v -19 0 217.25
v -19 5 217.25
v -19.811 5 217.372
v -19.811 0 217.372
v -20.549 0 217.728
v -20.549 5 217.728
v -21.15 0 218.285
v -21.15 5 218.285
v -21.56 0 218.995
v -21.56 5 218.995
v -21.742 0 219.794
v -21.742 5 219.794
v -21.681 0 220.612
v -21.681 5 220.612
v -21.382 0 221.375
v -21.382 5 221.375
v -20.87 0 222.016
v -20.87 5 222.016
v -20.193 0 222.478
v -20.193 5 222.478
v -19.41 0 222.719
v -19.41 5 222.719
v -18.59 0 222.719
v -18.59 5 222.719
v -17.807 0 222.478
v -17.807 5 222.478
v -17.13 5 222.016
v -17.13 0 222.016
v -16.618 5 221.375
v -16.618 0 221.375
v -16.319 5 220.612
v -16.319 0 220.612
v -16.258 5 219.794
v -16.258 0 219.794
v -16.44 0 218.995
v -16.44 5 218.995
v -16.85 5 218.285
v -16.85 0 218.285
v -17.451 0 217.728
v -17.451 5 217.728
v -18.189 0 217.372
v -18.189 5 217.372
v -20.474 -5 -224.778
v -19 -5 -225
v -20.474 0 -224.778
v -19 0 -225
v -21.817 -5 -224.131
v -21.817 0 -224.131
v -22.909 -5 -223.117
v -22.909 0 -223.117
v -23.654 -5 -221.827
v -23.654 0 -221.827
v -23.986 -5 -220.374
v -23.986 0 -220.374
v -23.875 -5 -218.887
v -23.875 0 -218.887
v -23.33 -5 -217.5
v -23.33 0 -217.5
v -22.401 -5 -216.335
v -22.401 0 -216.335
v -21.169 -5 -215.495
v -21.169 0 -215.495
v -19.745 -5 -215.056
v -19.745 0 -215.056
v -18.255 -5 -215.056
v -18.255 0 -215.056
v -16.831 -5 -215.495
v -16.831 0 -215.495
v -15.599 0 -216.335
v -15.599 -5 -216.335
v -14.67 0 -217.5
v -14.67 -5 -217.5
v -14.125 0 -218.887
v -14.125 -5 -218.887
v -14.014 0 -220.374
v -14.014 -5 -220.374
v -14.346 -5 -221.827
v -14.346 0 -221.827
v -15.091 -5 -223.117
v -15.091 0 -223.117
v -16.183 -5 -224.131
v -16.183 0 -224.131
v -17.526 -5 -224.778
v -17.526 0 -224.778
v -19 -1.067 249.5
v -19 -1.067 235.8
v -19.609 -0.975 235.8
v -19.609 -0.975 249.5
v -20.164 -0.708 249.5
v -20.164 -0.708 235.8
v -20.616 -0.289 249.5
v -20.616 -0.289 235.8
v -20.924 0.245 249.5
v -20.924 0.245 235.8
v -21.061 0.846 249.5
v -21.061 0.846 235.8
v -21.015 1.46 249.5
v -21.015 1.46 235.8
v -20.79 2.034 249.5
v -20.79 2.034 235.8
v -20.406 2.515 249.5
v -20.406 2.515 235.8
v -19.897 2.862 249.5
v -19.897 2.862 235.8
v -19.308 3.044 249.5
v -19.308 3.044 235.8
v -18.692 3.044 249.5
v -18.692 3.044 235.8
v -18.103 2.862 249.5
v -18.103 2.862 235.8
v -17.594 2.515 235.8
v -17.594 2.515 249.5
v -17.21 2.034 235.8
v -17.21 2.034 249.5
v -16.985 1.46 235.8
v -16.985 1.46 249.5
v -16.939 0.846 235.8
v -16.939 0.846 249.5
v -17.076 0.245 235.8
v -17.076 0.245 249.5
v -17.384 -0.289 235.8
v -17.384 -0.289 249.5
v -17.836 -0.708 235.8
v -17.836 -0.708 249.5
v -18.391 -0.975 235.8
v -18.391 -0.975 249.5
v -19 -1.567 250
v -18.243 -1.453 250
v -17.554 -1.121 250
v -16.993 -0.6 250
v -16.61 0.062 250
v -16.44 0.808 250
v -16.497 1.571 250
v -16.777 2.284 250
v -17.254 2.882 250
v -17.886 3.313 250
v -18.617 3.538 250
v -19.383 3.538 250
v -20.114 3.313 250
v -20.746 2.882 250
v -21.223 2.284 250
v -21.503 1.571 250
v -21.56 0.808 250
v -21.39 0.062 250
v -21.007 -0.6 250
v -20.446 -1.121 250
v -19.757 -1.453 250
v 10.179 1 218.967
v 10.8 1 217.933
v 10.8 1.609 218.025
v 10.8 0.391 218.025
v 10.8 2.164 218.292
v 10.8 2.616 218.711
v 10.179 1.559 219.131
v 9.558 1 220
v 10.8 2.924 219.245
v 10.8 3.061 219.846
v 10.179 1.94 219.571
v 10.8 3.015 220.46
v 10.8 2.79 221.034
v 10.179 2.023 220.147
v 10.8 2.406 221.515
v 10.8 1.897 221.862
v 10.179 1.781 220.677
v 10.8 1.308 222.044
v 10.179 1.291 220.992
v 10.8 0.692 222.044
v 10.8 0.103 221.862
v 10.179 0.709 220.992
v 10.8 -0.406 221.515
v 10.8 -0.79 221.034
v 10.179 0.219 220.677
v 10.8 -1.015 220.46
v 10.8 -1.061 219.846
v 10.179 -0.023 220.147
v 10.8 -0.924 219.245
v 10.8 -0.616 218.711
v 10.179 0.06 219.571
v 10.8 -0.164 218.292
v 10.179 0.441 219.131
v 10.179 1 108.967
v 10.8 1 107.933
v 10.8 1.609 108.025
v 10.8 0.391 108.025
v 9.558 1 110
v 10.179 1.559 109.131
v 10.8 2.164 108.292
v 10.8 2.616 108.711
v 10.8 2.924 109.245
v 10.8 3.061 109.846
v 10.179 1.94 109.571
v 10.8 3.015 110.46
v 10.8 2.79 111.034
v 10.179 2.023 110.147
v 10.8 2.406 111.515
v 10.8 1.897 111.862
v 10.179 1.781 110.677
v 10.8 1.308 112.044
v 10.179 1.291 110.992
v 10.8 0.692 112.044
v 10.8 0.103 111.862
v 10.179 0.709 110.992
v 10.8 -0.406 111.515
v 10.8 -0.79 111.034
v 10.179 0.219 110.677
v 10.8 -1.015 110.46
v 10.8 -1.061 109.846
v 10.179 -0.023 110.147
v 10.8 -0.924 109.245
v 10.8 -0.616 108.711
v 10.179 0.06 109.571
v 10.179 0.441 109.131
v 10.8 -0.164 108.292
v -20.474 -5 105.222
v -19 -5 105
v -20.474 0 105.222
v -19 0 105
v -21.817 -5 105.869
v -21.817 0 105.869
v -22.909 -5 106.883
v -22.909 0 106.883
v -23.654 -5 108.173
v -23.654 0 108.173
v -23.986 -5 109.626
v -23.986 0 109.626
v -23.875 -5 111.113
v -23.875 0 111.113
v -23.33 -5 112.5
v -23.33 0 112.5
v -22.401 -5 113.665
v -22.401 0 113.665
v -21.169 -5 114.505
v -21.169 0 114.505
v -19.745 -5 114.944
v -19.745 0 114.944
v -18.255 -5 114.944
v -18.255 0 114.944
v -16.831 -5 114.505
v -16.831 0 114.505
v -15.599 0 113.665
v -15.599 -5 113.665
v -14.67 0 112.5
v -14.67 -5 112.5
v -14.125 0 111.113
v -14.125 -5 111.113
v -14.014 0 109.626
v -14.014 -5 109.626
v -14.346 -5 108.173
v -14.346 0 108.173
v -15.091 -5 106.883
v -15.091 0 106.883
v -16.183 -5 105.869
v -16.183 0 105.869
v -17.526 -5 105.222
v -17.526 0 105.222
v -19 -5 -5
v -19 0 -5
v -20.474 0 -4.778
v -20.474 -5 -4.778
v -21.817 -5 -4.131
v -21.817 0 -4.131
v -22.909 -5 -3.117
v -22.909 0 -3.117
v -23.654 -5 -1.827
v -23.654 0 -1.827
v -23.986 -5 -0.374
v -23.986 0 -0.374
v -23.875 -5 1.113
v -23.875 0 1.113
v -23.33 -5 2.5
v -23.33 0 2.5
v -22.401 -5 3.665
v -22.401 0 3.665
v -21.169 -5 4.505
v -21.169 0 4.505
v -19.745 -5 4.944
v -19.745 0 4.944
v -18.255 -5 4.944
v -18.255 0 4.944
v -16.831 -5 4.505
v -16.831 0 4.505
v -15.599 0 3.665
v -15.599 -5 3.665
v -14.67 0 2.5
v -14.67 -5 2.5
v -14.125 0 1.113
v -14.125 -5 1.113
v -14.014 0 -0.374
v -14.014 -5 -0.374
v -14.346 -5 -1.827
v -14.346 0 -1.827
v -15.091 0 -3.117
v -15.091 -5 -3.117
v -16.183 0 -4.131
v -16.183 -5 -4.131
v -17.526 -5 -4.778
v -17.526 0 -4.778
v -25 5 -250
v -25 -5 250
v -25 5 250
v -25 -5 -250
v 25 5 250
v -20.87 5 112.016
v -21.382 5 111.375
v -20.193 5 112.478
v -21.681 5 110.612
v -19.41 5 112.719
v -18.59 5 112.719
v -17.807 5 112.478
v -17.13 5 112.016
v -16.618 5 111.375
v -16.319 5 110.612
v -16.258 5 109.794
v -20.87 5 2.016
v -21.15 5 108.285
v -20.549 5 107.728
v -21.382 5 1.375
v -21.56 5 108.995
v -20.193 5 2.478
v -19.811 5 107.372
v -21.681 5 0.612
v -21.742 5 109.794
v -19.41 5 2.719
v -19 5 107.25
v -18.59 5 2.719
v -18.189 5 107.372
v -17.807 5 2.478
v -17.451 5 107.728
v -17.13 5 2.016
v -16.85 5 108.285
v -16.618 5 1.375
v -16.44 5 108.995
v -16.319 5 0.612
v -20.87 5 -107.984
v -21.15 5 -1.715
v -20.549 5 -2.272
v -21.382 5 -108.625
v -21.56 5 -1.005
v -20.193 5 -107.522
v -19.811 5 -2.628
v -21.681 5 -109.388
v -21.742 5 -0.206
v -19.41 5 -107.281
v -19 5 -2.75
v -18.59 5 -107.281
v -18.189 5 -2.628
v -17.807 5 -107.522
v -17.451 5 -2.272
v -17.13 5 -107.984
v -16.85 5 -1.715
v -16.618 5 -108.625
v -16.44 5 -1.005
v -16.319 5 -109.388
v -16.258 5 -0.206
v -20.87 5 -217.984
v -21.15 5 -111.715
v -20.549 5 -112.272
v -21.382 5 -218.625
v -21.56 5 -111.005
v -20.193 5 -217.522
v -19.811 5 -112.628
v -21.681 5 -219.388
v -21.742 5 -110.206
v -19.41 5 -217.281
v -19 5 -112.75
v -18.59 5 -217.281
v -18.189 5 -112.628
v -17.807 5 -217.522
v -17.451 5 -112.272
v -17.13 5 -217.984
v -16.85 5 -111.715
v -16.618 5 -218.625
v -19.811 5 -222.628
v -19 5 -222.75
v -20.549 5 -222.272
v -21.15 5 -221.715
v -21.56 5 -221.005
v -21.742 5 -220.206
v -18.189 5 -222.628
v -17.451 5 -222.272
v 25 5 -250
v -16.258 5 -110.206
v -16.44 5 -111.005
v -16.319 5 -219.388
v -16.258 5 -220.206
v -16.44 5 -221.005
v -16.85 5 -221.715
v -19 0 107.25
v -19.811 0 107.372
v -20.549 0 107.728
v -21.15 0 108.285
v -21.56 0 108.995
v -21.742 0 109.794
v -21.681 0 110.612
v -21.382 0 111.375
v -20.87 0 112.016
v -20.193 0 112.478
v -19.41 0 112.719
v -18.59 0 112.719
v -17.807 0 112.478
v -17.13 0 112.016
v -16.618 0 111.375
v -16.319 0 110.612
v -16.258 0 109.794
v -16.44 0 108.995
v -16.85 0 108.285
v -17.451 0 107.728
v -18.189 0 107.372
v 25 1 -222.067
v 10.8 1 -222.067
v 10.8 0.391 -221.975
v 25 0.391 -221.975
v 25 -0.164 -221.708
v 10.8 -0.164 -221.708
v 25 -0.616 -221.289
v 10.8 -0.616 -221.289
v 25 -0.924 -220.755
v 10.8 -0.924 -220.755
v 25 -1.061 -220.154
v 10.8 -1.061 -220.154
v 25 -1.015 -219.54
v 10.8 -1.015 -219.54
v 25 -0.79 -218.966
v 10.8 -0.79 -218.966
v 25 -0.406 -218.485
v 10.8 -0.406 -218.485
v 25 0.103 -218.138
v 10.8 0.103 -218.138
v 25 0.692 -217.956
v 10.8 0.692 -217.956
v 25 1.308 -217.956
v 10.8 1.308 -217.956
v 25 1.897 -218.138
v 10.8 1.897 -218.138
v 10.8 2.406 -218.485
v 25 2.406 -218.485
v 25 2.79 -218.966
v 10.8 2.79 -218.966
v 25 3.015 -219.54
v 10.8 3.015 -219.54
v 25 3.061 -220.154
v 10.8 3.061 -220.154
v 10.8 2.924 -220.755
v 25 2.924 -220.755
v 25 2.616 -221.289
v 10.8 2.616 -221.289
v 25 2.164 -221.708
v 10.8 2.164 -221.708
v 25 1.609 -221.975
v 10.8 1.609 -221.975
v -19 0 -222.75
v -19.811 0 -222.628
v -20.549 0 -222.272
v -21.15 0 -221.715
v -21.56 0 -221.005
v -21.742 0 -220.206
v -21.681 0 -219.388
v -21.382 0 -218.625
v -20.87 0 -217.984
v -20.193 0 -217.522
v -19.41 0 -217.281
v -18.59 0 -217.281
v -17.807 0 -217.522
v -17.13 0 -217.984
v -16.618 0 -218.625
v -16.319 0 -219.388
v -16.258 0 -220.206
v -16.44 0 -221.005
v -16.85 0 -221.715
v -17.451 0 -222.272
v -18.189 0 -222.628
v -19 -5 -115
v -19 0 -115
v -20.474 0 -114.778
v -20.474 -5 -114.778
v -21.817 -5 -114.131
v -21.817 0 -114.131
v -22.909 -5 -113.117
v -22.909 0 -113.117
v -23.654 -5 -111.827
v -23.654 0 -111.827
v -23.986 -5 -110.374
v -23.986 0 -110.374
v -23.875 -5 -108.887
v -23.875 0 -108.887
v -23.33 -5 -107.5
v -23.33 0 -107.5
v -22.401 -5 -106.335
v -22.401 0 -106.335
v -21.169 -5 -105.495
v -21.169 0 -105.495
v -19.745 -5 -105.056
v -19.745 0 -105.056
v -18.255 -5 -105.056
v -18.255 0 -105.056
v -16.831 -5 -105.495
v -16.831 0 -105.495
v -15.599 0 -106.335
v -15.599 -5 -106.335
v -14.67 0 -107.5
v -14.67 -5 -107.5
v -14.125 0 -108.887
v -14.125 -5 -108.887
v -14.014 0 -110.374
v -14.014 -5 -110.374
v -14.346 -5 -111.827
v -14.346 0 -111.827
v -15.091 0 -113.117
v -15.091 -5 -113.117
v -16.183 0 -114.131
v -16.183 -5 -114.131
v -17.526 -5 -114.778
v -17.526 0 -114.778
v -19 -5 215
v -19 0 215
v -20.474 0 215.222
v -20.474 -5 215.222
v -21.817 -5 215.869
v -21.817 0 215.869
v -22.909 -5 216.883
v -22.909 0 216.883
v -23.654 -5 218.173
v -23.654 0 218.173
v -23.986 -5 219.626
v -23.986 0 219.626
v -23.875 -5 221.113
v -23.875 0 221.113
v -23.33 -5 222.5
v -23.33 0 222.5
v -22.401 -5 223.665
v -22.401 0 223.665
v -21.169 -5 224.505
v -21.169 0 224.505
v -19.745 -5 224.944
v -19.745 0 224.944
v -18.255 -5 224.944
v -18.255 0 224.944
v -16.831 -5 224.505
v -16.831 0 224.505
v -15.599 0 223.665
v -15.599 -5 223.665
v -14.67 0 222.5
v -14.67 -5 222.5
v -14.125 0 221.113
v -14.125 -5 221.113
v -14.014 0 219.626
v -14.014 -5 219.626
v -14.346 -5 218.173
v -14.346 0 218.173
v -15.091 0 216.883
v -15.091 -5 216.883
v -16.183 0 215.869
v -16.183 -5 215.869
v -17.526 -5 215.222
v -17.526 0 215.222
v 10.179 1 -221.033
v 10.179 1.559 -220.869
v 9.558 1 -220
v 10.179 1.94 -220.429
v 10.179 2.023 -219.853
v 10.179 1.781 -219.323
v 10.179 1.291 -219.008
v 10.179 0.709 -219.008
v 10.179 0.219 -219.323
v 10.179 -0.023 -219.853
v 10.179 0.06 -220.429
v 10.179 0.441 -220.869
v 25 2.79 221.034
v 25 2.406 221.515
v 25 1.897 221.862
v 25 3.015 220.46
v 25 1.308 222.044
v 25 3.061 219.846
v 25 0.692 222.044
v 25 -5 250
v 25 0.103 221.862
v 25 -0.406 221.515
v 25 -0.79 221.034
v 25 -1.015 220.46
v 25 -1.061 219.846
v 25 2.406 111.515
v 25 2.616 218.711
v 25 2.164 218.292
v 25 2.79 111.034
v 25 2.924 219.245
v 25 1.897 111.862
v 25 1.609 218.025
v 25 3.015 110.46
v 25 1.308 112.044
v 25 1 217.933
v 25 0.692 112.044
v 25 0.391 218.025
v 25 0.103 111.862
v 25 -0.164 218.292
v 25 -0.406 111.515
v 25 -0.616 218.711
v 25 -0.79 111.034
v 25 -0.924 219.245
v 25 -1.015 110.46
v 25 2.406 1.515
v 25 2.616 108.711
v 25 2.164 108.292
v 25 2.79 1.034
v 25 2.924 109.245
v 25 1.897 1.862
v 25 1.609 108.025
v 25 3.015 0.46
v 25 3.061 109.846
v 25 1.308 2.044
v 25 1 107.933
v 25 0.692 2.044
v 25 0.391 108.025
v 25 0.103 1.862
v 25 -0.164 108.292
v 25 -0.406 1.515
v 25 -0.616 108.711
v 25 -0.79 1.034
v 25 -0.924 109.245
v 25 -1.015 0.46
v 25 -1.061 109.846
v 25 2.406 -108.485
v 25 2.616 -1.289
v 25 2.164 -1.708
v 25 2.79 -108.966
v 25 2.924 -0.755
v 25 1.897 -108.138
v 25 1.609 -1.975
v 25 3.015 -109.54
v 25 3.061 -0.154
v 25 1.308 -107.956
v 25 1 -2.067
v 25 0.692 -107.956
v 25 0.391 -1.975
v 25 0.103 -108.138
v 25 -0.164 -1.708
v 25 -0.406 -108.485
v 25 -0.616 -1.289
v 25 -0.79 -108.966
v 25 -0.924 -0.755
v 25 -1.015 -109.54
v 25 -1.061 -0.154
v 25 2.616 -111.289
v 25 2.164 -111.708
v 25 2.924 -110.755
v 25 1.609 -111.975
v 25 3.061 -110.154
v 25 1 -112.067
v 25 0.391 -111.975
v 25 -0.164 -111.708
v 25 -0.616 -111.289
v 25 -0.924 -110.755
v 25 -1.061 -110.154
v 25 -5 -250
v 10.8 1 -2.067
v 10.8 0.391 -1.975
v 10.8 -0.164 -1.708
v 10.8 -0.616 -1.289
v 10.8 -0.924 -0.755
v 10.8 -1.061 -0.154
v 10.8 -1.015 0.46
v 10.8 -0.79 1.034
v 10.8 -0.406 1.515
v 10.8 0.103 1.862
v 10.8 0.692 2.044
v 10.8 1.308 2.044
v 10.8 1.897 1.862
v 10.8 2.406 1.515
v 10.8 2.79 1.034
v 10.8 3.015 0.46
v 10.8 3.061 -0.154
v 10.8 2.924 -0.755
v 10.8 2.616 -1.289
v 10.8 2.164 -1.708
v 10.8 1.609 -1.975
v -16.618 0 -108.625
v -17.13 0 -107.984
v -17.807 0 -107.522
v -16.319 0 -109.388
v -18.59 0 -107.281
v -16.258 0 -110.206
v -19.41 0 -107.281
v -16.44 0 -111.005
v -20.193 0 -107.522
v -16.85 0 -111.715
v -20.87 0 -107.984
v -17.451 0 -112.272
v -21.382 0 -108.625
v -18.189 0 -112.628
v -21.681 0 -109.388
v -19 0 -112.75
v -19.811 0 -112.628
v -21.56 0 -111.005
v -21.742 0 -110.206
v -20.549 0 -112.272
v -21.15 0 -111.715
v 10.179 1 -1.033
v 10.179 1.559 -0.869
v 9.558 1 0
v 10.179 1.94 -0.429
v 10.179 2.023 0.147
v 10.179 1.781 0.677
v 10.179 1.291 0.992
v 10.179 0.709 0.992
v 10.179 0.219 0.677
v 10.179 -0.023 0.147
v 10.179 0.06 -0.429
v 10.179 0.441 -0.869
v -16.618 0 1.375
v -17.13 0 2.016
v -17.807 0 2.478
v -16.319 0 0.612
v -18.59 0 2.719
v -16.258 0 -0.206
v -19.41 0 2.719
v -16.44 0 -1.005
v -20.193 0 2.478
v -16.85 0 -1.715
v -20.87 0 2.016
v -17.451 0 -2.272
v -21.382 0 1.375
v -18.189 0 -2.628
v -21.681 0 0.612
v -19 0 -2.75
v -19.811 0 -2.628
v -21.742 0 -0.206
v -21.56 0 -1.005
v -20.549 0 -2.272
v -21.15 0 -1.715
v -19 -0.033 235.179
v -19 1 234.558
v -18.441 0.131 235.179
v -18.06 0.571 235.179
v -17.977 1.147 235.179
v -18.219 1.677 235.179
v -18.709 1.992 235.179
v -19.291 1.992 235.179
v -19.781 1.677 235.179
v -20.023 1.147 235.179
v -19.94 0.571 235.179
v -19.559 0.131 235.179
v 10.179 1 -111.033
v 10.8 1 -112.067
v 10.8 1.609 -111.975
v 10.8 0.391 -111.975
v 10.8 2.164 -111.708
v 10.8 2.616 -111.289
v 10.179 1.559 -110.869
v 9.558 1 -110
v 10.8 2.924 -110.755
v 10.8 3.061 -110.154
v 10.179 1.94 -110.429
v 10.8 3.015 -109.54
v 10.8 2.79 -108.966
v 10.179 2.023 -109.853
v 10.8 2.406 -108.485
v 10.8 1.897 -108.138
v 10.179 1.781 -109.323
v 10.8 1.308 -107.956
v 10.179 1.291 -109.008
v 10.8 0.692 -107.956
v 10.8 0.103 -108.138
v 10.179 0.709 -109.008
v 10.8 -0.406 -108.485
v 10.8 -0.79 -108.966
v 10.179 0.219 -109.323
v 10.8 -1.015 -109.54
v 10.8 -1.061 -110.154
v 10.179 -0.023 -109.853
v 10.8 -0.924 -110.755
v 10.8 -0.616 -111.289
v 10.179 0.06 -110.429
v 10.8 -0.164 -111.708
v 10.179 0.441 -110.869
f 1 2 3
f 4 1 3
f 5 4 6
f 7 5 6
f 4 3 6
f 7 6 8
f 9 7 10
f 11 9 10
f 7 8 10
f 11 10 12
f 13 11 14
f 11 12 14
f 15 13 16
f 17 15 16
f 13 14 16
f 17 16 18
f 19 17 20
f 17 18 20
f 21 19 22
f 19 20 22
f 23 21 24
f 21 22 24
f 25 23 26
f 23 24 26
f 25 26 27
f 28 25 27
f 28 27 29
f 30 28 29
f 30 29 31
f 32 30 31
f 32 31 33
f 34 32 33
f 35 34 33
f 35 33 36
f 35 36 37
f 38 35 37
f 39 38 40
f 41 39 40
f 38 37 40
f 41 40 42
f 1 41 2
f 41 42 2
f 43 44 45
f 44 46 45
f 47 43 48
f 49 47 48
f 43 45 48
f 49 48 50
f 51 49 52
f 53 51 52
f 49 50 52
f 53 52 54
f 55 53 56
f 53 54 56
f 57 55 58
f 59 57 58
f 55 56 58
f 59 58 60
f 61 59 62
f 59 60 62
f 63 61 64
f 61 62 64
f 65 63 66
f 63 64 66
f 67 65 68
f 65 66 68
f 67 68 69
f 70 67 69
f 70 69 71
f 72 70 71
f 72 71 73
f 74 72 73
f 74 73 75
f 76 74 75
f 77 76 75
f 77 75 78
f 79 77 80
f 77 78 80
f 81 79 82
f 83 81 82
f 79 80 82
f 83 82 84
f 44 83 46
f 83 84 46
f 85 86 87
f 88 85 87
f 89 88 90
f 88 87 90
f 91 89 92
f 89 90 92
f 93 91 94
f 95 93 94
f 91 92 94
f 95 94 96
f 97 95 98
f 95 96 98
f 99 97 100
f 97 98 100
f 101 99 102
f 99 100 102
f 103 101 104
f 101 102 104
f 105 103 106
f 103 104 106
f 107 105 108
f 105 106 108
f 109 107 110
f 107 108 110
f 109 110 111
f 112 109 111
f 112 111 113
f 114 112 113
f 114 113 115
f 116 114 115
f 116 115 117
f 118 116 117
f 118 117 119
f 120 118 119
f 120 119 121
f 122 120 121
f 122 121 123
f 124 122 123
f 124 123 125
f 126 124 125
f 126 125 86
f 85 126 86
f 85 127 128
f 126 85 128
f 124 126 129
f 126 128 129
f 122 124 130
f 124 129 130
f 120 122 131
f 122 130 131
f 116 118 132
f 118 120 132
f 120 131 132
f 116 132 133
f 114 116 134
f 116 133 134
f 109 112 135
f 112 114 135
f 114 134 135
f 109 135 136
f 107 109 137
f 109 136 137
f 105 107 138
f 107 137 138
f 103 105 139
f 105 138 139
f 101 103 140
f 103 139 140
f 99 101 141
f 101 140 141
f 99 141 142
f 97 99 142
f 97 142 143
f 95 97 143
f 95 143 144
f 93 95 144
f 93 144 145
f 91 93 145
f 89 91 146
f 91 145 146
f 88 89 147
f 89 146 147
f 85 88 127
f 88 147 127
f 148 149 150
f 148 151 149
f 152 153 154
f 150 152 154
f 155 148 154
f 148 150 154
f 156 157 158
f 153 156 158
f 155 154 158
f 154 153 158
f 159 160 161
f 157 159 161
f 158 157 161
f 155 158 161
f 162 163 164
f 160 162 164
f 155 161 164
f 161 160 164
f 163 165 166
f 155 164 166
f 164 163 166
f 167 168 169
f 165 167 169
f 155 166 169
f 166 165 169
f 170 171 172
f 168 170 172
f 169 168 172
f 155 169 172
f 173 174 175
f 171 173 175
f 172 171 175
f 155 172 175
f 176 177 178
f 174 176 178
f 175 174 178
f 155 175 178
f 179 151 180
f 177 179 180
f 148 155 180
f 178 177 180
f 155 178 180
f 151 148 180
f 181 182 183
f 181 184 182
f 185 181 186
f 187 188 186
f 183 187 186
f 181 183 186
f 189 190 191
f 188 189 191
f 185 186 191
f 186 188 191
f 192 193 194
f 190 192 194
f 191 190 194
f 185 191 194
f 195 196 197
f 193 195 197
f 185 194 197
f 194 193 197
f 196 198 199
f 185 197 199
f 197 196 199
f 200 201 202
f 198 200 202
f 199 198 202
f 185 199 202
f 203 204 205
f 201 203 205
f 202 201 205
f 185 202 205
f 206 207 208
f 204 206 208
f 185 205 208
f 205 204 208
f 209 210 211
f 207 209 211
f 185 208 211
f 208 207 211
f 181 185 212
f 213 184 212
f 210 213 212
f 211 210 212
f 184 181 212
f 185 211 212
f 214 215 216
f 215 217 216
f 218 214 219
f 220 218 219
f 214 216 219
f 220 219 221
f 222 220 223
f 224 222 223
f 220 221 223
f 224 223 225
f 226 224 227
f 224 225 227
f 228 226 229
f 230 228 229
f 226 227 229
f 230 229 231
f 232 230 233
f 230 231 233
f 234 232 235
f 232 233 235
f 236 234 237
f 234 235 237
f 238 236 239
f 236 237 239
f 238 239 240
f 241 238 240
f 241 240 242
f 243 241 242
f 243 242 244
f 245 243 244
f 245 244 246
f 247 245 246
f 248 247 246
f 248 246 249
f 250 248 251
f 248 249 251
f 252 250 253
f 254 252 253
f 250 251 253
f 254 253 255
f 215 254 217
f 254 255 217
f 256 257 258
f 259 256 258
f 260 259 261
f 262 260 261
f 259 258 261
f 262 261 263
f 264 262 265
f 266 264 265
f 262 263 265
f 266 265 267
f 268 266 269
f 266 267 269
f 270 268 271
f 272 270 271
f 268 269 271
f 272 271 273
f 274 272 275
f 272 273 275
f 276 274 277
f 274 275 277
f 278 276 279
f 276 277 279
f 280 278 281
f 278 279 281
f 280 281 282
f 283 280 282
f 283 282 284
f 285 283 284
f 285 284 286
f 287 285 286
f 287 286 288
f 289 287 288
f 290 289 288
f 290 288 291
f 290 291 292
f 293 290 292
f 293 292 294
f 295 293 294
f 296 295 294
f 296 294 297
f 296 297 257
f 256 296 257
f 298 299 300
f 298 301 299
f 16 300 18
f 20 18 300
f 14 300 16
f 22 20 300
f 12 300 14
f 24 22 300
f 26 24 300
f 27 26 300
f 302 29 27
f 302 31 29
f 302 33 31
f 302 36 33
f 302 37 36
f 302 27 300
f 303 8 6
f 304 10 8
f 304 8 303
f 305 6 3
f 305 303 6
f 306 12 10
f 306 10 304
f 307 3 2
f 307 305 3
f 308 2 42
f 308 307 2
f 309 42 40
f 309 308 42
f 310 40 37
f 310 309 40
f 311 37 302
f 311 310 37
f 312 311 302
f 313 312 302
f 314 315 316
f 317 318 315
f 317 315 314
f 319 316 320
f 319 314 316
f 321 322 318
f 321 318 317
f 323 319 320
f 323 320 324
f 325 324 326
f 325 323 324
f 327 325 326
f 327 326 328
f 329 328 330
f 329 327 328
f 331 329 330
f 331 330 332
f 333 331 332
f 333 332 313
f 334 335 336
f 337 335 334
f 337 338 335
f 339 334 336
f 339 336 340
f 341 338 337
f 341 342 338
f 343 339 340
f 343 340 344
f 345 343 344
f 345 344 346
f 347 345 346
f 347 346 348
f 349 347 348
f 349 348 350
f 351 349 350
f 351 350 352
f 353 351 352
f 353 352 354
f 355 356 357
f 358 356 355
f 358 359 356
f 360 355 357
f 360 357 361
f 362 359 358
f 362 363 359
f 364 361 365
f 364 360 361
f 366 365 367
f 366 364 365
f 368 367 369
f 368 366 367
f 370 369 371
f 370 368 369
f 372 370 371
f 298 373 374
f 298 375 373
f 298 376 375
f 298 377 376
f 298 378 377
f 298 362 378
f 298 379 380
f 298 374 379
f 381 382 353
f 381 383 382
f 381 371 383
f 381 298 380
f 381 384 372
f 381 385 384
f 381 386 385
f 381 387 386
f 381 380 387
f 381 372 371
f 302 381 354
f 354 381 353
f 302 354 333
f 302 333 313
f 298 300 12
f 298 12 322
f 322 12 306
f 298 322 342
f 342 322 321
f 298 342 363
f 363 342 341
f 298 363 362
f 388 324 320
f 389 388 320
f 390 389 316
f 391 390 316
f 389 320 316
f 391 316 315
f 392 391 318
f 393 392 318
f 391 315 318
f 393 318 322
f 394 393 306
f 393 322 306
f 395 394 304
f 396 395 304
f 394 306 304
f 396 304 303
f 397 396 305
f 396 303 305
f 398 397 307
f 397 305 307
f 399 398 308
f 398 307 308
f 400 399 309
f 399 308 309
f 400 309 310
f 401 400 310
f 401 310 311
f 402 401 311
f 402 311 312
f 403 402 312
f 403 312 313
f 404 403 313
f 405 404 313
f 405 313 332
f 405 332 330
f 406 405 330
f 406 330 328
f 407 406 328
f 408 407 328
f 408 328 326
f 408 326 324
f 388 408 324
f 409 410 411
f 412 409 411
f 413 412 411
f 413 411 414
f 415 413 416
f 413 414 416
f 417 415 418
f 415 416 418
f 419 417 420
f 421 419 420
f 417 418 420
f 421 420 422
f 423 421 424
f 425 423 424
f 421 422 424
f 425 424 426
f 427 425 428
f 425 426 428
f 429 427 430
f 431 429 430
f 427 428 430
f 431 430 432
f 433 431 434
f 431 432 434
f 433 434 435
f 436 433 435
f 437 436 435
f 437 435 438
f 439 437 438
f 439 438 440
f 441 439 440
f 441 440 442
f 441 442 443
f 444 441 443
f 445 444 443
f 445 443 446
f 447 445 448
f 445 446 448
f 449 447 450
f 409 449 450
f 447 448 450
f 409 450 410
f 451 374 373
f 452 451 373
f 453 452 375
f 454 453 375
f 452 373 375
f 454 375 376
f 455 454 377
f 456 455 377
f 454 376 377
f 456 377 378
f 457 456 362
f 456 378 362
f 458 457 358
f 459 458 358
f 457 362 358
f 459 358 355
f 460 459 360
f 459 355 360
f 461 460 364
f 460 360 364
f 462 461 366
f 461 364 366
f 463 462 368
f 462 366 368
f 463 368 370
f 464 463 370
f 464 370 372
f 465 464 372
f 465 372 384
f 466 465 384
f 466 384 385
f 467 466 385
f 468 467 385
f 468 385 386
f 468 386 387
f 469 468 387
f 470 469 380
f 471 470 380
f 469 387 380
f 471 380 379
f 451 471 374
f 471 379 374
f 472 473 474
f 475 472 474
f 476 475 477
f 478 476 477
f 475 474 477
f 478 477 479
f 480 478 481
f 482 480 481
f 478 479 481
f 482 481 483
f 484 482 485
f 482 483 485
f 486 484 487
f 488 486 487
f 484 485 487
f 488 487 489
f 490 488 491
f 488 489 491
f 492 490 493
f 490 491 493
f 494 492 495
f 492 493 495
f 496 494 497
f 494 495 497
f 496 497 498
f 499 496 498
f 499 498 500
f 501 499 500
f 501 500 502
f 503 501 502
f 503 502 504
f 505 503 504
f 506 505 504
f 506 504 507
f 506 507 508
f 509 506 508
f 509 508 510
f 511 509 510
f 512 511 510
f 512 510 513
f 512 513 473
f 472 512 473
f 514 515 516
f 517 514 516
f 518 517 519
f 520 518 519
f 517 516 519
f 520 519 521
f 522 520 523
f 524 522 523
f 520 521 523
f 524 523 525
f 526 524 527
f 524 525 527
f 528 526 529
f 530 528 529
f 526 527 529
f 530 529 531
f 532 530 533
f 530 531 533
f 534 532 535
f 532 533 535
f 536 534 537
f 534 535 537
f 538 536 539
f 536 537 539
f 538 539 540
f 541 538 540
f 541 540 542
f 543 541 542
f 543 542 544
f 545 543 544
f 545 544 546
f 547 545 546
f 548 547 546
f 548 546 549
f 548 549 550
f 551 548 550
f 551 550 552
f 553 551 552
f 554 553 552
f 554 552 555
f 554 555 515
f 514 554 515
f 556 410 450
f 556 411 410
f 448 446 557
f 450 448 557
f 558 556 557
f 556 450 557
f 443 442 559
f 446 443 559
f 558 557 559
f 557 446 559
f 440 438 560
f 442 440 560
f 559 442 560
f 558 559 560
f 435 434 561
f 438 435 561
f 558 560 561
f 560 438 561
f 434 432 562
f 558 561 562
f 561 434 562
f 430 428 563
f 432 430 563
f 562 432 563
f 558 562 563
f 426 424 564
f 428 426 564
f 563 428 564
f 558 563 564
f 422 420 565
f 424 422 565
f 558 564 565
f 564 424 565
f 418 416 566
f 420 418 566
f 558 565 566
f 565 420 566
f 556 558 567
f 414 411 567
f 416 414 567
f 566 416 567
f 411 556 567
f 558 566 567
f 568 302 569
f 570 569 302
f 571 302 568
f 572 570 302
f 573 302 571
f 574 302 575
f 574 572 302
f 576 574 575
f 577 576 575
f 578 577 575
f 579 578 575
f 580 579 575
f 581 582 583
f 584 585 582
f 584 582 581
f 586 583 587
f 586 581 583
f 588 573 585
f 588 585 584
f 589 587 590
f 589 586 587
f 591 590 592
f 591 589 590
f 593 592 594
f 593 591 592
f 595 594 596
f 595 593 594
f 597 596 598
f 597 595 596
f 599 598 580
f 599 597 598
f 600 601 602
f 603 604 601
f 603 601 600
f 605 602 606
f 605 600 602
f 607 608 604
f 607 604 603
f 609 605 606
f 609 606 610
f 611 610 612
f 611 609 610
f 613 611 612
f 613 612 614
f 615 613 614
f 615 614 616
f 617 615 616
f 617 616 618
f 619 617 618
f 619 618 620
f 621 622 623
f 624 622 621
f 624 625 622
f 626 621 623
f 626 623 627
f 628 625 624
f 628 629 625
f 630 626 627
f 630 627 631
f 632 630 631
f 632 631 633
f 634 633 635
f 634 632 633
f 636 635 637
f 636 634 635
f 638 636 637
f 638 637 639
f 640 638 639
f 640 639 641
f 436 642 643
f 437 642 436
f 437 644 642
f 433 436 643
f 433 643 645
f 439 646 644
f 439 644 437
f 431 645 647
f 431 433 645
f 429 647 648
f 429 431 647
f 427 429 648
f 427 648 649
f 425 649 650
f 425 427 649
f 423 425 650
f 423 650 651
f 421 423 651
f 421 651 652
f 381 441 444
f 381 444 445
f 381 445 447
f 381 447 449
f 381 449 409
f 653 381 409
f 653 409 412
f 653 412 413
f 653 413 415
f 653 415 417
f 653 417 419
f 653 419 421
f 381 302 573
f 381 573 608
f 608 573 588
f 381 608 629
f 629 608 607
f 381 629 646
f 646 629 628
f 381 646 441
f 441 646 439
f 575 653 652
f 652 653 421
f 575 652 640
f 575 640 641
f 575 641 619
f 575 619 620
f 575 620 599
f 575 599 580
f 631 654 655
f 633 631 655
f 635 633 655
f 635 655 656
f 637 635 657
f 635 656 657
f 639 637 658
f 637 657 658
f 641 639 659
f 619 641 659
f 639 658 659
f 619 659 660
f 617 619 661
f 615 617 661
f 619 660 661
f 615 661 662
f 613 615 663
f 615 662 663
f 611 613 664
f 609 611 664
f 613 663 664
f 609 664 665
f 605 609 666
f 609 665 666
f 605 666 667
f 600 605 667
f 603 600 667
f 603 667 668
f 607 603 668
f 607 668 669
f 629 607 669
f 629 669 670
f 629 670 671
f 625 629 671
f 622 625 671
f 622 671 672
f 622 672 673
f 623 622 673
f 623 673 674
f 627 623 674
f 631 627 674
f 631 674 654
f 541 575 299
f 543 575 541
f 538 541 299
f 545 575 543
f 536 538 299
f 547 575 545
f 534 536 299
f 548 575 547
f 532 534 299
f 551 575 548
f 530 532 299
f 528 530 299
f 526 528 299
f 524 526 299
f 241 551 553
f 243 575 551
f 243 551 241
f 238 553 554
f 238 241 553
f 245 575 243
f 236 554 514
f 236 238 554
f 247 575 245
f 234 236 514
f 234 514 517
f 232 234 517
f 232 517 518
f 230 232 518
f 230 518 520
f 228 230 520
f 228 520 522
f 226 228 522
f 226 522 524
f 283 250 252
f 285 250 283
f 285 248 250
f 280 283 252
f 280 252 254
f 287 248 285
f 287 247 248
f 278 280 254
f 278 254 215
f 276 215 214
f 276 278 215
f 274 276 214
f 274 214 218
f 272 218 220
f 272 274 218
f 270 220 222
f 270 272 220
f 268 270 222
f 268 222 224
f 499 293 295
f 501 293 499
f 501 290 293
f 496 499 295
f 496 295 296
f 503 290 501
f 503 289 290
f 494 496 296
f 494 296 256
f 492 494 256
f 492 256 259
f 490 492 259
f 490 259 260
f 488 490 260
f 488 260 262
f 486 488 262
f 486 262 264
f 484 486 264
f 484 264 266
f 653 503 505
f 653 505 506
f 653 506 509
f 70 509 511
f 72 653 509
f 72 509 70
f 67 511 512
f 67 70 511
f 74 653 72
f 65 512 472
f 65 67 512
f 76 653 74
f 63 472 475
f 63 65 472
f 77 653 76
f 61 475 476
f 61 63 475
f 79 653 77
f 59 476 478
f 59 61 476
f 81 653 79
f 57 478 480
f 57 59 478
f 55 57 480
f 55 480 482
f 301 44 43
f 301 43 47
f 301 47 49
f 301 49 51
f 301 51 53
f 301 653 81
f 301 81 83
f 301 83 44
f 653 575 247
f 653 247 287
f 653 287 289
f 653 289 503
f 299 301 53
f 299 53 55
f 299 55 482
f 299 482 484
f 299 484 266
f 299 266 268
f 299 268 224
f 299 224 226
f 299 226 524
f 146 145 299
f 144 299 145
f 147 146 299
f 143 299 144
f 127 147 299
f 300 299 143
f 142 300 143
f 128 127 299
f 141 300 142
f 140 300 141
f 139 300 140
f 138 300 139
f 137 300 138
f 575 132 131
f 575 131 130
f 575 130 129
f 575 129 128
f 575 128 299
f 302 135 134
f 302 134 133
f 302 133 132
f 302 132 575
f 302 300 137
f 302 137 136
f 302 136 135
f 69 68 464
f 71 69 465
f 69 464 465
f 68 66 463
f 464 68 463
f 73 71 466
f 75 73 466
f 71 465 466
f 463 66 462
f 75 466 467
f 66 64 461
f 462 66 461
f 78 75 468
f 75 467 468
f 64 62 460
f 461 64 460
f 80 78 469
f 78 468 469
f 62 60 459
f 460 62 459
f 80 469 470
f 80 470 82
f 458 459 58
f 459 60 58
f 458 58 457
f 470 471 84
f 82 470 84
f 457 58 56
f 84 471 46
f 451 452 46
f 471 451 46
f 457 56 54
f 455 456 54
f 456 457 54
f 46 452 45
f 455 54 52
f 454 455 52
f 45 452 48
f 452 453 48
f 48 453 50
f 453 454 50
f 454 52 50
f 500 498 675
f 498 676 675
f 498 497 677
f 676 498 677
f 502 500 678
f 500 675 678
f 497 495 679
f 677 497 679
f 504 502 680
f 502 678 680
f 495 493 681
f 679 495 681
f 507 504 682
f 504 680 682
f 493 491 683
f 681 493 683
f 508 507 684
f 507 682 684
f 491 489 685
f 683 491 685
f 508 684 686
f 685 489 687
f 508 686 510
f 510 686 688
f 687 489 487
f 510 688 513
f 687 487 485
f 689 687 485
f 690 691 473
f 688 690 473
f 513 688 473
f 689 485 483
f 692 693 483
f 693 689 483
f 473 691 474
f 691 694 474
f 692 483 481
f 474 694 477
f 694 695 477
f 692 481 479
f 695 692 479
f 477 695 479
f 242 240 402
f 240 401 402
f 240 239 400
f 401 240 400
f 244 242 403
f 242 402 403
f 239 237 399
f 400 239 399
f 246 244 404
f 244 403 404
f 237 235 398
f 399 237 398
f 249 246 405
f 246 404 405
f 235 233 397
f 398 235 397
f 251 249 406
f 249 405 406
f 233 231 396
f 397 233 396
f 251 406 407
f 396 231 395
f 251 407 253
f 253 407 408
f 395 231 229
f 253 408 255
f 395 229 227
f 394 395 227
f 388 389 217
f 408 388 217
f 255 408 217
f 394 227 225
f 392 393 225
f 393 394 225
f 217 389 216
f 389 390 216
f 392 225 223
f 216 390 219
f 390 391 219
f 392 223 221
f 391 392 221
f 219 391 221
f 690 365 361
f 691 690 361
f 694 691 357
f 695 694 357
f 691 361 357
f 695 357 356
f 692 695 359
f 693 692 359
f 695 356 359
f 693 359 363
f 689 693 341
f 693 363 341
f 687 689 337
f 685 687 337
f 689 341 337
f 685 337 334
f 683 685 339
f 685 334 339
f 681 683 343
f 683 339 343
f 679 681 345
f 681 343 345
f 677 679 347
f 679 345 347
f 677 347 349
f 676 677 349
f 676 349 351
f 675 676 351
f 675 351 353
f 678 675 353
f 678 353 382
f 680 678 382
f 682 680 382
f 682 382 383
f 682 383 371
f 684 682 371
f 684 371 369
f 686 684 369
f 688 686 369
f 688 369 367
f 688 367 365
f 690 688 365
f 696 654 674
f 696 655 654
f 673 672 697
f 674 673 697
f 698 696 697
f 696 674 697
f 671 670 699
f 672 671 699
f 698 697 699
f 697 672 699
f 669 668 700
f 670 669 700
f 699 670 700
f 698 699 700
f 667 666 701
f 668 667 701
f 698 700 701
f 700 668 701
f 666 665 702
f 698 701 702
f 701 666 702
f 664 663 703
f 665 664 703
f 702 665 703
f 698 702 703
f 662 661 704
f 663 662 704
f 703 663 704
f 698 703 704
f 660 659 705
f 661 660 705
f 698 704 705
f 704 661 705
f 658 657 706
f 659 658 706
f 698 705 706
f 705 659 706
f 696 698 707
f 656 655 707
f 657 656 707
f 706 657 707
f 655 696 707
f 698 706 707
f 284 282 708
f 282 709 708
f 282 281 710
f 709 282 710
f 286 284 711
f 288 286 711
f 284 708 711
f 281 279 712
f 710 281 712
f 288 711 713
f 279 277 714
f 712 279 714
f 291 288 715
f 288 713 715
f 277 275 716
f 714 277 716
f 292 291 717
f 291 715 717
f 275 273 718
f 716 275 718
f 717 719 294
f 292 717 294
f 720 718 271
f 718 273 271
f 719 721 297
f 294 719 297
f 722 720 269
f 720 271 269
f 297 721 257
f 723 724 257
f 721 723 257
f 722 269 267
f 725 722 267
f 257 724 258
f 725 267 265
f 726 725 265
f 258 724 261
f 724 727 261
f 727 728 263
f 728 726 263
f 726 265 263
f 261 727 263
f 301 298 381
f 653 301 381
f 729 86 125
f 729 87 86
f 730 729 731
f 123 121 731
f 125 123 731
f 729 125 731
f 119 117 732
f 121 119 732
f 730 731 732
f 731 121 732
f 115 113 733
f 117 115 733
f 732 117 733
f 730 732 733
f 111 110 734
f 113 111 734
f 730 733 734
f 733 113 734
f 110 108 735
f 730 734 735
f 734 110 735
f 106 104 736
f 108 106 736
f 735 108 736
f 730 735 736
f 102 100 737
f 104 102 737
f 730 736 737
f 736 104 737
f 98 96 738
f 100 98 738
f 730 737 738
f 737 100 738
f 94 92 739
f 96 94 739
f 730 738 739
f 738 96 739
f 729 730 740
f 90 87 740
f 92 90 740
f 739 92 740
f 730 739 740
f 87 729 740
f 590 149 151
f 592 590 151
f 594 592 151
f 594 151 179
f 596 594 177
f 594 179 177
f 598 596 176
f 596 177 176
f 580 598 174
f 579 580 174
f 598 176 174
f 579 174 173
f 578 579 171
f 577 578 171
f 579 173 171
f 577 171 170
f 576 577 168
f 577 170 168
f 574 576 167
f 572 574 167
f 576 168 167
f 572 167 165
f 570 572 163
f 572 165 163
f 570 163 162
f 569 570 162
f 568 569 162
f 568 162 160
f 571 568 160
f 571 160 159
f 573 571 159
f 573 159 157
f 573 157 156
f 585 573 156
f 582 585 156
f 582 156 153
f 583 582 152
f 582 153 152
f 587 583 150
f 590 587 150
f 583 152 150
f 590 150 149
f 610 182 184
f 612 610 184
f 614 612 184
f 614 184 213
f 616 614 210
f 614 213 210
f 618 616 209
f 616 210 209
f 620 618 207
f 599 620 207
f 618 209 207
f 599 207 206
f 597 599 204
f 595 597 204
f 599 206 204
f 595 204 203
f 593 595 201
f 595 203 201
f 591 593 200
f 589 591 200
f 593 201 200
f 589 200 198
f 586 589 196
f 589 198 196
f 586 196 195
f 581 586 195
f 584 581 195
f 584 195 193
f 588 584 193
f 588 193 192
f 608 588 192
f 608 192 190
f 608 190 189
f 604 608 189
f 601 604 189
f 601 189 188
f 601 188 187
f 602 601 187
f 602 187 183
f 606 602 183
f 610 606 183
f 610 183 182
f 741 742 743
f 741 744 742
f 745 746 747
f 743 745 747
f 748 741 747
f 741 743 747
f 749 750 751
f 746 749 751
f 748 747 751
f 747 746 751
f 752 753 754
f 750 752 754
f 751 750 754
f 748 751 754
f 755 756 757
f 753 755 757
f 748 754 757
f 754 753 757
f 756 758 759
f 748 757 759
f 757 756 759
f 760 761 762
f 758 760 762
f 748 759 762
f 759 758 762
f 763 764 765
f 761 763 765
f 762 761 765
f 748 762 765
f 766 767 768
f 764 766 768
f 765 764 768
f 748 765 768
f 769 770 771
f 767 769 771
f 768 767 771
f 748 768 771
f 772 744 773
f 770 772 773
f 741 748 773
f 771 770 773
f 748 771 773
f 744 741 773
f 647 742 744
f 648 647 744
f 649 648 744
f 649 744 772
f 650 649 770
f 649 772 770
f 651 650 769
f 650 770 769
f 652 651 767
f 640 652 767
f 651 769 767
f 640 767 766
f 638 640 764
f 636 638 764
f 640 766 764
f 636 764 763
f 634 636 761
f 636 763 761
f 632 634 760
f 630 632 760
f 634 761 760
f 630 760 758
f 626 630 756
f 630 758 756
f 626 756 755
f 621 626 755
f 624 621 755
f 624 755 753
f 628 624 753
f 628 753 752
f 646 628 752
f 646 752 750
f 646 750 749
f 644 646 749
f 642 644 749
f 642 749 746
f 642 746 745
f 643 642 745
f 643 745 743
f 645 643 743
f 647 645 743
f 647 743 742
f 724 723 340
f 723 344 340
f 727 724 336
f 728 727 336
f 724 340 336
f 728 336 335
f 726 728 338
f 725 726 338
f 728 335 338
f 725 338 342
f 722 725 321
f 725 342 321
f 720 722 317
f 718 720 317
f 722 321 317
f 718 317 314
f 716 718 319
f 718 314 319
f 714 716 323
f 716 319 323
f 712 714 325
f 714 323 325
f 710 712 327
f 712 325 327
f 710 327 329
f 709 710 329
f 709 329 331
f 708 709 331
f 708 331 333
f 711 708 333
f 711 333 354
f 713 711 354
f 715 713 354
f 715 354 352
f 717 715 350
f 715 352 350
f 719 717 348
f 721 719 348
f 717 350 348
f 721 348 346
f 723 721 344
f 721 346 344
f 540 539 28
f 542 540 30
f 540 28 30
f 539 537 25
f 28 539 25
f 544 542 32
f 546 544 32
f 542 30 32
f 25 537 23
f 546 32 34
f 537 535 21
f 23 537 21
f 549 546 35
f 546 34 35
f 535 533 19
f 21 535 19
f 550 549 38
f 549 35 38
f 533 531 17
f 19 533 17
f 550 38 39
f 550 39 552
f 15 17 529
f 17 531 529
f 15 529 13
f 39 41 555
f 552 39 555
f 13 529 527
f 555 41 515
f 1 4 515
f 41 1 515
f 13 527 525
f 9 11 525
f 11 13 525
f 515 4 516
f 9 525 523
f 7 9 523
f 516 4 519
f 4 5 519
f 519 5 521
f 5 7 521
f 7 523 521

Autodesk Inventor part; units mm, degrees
ref_plane "YZ Plane" through (0, 0, 0) normal (1, 0, 0) x (0, 1, 0)
ref_plane "XZ Plane" through (0, 0, 0) normal (0, 1, 0) x (-1, 0, 0)
ref_plane "XY Plane" through (0, 0, 0) normal (0, 0, 1) x (1, 0, 0)
sketch "Skizze1" plane through (0, 0, 0) normal (0, 0, 1) x (1, 0, 0)
  line L0 (-25, 5) -> (25, 5)
  line L1 (25, 5) -> (25, -5)
  line L2 (25, -5) -> (-25, -5)
  line L3 (-25, -5) -> (-25, 5)
  line L4 (-25, 5) -> (25, -5) construction
  line L5 (25, 5) -> (-25, -5) construction
  point P0 (0, 0)
  dimension "d0" = 50
  dimension "d1" = 10
extrude "Extrusion1" add sketch "Skizze1" along normal mid plane 500
sketch "Skizze4" plane through (-25, -5, 250) normal (0, -1, 0) x (1, 0, 0)
  line L0 (50, -500) -> (50, 0) projected
  line L1 (0, 0) -> (50, 0) projected
  line L2 (0, 0) -> (0, -500) projected
  line L3 (50, -500) -> (0, -500) projected
  point P0 (25, -250)
  point P1 (30, -465)
  dimension "d13" = 30
  dimension "d14" = 35
hole "Bohrung2" [suppressed]
sketch "Skizze5" plane through (-25, -5, 250) normal (0, -1, 0) x (1, 0, 0)
  line L0 (50, -500) -> (50, 0) projected
  line L1 (0, 0) -> (50, 0) projected
  line L2 (0, 0) -> (0, -500) projected
  line L3 (50, -500) -> (0, -500) projected
  point P0 (25, -250)
  point P1 (6, -250)
  point P2 (0, -250)
  dimension "d22" = 6
hole "Bohrung3" at (-19, -5, 0) direction (0, 1, 0) diameter 5.5 depth 32.3 tip angle 118 counterbore diameter 10 counterbore depth 5
pattern_linear "Rechteckige Anordnung1" count 3 spacing 110 along (0, 0, -1) count 3 spacing 110 along (0, 0, 1) of "Bohrung3"
sketch "Skizze6" plane through (25, 5, 250) normal (1, 0, 0) x (0, 0, -1)
  line L0 (500, 0) -> (0, 0) projected
  line L1 (0, -10) -> (0, 0) projected
  line L2 (500, -10) -> (0, -10) projected
  line L3 (500, 0) -> (500, -10) projected
  point P0 (250, -5)
  point P1 (250, -4)
  dimension "d60" = 6
hole "Bohrung4" at (25, 1, 0) direction (-1, 0, 0) diameter 4.134 depth 14.2 tip angle 118 thread size "M5x0.8" class "6H" standard "ISO Metric profile"
pattern_linear "Rechteckige Anordnung2" count 3 spacing 110 along (0, 0, 1) count 3 spacing 110 along (0, 0, -1) of "Bohrung4"
sketch "Skizze7" plane through (0, 0, 250) normal (0, 0, 1) x (1, 0, 0)
  line L0 (-21.75, 5) -> (-21.75, 0) projected
  line L1 (-25, 5) -> (-25, -5) projected
  line L2 (25, 5) -> (-25, 5) projected
  point P0 (0, 0)
  point P1 (-19, 1)
  dimension "d49" = 6
  dimension "d61" = 4
hole "Bohrung5" at (-19, 1, 250) direction (0, 0, -1) diameter 4.134 depth 14.2 tip angle 118 thread size "M5x0.8" class "6H" standard "ISO Metric profile"
chamfer "Fasen1" distance 0.5 angle 45 1 edges at (-19, 3.067, 250)
properties part number "Platte-2"
